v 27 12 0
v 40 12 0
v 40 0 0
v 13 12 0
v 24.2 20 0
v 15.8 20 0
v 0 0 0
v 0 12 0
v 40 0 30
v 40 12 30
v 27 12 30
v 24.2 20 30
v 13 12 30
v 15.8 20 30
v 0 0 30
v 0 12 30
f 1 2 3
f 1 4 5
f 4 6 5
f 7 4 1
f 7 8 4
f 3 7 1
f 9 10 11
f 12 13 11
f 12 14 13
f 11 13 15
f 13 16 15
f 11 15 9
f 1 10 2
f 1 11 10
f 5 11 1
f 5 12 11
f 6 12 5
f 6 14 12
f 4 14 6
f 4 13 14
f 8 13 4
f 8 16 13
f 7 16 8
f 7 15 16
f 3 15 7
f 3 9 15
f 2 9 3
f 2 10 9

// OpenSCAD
$fn = 32;

// ----------------------------------------------------------------------
// V guide rail: dovetail, 40 mm wide
// ----------------------------------------------------------------------

// --- parameters (mm) ---
rail_w = 40;              // rail width, X
base_t = 12;              // base plate thickness
v_depth = 8;              // V feature depth / height
v_half_w = 7;             // half width of the V at the base face
plate_t = 30;             // rail length, Z (the extrusion height)
top_half_w = 4.2;         // half width at the dovetail top

dovetail_base = 2 * v_half_w;  // dovetail width at the base
dovetail_top = 2 * top_half_w;  // dovetail width at the top

profile = [[0, 0], [40, 0], [40, 12], [27, 12], [24.2, 20], [15.8, 20], [13, 12], [0, 12]];  // primary outline, 8 points, counter clockwise

// --- the one profile operation ---
linear_extrude(height = plate_t) polygon(points = profile);
